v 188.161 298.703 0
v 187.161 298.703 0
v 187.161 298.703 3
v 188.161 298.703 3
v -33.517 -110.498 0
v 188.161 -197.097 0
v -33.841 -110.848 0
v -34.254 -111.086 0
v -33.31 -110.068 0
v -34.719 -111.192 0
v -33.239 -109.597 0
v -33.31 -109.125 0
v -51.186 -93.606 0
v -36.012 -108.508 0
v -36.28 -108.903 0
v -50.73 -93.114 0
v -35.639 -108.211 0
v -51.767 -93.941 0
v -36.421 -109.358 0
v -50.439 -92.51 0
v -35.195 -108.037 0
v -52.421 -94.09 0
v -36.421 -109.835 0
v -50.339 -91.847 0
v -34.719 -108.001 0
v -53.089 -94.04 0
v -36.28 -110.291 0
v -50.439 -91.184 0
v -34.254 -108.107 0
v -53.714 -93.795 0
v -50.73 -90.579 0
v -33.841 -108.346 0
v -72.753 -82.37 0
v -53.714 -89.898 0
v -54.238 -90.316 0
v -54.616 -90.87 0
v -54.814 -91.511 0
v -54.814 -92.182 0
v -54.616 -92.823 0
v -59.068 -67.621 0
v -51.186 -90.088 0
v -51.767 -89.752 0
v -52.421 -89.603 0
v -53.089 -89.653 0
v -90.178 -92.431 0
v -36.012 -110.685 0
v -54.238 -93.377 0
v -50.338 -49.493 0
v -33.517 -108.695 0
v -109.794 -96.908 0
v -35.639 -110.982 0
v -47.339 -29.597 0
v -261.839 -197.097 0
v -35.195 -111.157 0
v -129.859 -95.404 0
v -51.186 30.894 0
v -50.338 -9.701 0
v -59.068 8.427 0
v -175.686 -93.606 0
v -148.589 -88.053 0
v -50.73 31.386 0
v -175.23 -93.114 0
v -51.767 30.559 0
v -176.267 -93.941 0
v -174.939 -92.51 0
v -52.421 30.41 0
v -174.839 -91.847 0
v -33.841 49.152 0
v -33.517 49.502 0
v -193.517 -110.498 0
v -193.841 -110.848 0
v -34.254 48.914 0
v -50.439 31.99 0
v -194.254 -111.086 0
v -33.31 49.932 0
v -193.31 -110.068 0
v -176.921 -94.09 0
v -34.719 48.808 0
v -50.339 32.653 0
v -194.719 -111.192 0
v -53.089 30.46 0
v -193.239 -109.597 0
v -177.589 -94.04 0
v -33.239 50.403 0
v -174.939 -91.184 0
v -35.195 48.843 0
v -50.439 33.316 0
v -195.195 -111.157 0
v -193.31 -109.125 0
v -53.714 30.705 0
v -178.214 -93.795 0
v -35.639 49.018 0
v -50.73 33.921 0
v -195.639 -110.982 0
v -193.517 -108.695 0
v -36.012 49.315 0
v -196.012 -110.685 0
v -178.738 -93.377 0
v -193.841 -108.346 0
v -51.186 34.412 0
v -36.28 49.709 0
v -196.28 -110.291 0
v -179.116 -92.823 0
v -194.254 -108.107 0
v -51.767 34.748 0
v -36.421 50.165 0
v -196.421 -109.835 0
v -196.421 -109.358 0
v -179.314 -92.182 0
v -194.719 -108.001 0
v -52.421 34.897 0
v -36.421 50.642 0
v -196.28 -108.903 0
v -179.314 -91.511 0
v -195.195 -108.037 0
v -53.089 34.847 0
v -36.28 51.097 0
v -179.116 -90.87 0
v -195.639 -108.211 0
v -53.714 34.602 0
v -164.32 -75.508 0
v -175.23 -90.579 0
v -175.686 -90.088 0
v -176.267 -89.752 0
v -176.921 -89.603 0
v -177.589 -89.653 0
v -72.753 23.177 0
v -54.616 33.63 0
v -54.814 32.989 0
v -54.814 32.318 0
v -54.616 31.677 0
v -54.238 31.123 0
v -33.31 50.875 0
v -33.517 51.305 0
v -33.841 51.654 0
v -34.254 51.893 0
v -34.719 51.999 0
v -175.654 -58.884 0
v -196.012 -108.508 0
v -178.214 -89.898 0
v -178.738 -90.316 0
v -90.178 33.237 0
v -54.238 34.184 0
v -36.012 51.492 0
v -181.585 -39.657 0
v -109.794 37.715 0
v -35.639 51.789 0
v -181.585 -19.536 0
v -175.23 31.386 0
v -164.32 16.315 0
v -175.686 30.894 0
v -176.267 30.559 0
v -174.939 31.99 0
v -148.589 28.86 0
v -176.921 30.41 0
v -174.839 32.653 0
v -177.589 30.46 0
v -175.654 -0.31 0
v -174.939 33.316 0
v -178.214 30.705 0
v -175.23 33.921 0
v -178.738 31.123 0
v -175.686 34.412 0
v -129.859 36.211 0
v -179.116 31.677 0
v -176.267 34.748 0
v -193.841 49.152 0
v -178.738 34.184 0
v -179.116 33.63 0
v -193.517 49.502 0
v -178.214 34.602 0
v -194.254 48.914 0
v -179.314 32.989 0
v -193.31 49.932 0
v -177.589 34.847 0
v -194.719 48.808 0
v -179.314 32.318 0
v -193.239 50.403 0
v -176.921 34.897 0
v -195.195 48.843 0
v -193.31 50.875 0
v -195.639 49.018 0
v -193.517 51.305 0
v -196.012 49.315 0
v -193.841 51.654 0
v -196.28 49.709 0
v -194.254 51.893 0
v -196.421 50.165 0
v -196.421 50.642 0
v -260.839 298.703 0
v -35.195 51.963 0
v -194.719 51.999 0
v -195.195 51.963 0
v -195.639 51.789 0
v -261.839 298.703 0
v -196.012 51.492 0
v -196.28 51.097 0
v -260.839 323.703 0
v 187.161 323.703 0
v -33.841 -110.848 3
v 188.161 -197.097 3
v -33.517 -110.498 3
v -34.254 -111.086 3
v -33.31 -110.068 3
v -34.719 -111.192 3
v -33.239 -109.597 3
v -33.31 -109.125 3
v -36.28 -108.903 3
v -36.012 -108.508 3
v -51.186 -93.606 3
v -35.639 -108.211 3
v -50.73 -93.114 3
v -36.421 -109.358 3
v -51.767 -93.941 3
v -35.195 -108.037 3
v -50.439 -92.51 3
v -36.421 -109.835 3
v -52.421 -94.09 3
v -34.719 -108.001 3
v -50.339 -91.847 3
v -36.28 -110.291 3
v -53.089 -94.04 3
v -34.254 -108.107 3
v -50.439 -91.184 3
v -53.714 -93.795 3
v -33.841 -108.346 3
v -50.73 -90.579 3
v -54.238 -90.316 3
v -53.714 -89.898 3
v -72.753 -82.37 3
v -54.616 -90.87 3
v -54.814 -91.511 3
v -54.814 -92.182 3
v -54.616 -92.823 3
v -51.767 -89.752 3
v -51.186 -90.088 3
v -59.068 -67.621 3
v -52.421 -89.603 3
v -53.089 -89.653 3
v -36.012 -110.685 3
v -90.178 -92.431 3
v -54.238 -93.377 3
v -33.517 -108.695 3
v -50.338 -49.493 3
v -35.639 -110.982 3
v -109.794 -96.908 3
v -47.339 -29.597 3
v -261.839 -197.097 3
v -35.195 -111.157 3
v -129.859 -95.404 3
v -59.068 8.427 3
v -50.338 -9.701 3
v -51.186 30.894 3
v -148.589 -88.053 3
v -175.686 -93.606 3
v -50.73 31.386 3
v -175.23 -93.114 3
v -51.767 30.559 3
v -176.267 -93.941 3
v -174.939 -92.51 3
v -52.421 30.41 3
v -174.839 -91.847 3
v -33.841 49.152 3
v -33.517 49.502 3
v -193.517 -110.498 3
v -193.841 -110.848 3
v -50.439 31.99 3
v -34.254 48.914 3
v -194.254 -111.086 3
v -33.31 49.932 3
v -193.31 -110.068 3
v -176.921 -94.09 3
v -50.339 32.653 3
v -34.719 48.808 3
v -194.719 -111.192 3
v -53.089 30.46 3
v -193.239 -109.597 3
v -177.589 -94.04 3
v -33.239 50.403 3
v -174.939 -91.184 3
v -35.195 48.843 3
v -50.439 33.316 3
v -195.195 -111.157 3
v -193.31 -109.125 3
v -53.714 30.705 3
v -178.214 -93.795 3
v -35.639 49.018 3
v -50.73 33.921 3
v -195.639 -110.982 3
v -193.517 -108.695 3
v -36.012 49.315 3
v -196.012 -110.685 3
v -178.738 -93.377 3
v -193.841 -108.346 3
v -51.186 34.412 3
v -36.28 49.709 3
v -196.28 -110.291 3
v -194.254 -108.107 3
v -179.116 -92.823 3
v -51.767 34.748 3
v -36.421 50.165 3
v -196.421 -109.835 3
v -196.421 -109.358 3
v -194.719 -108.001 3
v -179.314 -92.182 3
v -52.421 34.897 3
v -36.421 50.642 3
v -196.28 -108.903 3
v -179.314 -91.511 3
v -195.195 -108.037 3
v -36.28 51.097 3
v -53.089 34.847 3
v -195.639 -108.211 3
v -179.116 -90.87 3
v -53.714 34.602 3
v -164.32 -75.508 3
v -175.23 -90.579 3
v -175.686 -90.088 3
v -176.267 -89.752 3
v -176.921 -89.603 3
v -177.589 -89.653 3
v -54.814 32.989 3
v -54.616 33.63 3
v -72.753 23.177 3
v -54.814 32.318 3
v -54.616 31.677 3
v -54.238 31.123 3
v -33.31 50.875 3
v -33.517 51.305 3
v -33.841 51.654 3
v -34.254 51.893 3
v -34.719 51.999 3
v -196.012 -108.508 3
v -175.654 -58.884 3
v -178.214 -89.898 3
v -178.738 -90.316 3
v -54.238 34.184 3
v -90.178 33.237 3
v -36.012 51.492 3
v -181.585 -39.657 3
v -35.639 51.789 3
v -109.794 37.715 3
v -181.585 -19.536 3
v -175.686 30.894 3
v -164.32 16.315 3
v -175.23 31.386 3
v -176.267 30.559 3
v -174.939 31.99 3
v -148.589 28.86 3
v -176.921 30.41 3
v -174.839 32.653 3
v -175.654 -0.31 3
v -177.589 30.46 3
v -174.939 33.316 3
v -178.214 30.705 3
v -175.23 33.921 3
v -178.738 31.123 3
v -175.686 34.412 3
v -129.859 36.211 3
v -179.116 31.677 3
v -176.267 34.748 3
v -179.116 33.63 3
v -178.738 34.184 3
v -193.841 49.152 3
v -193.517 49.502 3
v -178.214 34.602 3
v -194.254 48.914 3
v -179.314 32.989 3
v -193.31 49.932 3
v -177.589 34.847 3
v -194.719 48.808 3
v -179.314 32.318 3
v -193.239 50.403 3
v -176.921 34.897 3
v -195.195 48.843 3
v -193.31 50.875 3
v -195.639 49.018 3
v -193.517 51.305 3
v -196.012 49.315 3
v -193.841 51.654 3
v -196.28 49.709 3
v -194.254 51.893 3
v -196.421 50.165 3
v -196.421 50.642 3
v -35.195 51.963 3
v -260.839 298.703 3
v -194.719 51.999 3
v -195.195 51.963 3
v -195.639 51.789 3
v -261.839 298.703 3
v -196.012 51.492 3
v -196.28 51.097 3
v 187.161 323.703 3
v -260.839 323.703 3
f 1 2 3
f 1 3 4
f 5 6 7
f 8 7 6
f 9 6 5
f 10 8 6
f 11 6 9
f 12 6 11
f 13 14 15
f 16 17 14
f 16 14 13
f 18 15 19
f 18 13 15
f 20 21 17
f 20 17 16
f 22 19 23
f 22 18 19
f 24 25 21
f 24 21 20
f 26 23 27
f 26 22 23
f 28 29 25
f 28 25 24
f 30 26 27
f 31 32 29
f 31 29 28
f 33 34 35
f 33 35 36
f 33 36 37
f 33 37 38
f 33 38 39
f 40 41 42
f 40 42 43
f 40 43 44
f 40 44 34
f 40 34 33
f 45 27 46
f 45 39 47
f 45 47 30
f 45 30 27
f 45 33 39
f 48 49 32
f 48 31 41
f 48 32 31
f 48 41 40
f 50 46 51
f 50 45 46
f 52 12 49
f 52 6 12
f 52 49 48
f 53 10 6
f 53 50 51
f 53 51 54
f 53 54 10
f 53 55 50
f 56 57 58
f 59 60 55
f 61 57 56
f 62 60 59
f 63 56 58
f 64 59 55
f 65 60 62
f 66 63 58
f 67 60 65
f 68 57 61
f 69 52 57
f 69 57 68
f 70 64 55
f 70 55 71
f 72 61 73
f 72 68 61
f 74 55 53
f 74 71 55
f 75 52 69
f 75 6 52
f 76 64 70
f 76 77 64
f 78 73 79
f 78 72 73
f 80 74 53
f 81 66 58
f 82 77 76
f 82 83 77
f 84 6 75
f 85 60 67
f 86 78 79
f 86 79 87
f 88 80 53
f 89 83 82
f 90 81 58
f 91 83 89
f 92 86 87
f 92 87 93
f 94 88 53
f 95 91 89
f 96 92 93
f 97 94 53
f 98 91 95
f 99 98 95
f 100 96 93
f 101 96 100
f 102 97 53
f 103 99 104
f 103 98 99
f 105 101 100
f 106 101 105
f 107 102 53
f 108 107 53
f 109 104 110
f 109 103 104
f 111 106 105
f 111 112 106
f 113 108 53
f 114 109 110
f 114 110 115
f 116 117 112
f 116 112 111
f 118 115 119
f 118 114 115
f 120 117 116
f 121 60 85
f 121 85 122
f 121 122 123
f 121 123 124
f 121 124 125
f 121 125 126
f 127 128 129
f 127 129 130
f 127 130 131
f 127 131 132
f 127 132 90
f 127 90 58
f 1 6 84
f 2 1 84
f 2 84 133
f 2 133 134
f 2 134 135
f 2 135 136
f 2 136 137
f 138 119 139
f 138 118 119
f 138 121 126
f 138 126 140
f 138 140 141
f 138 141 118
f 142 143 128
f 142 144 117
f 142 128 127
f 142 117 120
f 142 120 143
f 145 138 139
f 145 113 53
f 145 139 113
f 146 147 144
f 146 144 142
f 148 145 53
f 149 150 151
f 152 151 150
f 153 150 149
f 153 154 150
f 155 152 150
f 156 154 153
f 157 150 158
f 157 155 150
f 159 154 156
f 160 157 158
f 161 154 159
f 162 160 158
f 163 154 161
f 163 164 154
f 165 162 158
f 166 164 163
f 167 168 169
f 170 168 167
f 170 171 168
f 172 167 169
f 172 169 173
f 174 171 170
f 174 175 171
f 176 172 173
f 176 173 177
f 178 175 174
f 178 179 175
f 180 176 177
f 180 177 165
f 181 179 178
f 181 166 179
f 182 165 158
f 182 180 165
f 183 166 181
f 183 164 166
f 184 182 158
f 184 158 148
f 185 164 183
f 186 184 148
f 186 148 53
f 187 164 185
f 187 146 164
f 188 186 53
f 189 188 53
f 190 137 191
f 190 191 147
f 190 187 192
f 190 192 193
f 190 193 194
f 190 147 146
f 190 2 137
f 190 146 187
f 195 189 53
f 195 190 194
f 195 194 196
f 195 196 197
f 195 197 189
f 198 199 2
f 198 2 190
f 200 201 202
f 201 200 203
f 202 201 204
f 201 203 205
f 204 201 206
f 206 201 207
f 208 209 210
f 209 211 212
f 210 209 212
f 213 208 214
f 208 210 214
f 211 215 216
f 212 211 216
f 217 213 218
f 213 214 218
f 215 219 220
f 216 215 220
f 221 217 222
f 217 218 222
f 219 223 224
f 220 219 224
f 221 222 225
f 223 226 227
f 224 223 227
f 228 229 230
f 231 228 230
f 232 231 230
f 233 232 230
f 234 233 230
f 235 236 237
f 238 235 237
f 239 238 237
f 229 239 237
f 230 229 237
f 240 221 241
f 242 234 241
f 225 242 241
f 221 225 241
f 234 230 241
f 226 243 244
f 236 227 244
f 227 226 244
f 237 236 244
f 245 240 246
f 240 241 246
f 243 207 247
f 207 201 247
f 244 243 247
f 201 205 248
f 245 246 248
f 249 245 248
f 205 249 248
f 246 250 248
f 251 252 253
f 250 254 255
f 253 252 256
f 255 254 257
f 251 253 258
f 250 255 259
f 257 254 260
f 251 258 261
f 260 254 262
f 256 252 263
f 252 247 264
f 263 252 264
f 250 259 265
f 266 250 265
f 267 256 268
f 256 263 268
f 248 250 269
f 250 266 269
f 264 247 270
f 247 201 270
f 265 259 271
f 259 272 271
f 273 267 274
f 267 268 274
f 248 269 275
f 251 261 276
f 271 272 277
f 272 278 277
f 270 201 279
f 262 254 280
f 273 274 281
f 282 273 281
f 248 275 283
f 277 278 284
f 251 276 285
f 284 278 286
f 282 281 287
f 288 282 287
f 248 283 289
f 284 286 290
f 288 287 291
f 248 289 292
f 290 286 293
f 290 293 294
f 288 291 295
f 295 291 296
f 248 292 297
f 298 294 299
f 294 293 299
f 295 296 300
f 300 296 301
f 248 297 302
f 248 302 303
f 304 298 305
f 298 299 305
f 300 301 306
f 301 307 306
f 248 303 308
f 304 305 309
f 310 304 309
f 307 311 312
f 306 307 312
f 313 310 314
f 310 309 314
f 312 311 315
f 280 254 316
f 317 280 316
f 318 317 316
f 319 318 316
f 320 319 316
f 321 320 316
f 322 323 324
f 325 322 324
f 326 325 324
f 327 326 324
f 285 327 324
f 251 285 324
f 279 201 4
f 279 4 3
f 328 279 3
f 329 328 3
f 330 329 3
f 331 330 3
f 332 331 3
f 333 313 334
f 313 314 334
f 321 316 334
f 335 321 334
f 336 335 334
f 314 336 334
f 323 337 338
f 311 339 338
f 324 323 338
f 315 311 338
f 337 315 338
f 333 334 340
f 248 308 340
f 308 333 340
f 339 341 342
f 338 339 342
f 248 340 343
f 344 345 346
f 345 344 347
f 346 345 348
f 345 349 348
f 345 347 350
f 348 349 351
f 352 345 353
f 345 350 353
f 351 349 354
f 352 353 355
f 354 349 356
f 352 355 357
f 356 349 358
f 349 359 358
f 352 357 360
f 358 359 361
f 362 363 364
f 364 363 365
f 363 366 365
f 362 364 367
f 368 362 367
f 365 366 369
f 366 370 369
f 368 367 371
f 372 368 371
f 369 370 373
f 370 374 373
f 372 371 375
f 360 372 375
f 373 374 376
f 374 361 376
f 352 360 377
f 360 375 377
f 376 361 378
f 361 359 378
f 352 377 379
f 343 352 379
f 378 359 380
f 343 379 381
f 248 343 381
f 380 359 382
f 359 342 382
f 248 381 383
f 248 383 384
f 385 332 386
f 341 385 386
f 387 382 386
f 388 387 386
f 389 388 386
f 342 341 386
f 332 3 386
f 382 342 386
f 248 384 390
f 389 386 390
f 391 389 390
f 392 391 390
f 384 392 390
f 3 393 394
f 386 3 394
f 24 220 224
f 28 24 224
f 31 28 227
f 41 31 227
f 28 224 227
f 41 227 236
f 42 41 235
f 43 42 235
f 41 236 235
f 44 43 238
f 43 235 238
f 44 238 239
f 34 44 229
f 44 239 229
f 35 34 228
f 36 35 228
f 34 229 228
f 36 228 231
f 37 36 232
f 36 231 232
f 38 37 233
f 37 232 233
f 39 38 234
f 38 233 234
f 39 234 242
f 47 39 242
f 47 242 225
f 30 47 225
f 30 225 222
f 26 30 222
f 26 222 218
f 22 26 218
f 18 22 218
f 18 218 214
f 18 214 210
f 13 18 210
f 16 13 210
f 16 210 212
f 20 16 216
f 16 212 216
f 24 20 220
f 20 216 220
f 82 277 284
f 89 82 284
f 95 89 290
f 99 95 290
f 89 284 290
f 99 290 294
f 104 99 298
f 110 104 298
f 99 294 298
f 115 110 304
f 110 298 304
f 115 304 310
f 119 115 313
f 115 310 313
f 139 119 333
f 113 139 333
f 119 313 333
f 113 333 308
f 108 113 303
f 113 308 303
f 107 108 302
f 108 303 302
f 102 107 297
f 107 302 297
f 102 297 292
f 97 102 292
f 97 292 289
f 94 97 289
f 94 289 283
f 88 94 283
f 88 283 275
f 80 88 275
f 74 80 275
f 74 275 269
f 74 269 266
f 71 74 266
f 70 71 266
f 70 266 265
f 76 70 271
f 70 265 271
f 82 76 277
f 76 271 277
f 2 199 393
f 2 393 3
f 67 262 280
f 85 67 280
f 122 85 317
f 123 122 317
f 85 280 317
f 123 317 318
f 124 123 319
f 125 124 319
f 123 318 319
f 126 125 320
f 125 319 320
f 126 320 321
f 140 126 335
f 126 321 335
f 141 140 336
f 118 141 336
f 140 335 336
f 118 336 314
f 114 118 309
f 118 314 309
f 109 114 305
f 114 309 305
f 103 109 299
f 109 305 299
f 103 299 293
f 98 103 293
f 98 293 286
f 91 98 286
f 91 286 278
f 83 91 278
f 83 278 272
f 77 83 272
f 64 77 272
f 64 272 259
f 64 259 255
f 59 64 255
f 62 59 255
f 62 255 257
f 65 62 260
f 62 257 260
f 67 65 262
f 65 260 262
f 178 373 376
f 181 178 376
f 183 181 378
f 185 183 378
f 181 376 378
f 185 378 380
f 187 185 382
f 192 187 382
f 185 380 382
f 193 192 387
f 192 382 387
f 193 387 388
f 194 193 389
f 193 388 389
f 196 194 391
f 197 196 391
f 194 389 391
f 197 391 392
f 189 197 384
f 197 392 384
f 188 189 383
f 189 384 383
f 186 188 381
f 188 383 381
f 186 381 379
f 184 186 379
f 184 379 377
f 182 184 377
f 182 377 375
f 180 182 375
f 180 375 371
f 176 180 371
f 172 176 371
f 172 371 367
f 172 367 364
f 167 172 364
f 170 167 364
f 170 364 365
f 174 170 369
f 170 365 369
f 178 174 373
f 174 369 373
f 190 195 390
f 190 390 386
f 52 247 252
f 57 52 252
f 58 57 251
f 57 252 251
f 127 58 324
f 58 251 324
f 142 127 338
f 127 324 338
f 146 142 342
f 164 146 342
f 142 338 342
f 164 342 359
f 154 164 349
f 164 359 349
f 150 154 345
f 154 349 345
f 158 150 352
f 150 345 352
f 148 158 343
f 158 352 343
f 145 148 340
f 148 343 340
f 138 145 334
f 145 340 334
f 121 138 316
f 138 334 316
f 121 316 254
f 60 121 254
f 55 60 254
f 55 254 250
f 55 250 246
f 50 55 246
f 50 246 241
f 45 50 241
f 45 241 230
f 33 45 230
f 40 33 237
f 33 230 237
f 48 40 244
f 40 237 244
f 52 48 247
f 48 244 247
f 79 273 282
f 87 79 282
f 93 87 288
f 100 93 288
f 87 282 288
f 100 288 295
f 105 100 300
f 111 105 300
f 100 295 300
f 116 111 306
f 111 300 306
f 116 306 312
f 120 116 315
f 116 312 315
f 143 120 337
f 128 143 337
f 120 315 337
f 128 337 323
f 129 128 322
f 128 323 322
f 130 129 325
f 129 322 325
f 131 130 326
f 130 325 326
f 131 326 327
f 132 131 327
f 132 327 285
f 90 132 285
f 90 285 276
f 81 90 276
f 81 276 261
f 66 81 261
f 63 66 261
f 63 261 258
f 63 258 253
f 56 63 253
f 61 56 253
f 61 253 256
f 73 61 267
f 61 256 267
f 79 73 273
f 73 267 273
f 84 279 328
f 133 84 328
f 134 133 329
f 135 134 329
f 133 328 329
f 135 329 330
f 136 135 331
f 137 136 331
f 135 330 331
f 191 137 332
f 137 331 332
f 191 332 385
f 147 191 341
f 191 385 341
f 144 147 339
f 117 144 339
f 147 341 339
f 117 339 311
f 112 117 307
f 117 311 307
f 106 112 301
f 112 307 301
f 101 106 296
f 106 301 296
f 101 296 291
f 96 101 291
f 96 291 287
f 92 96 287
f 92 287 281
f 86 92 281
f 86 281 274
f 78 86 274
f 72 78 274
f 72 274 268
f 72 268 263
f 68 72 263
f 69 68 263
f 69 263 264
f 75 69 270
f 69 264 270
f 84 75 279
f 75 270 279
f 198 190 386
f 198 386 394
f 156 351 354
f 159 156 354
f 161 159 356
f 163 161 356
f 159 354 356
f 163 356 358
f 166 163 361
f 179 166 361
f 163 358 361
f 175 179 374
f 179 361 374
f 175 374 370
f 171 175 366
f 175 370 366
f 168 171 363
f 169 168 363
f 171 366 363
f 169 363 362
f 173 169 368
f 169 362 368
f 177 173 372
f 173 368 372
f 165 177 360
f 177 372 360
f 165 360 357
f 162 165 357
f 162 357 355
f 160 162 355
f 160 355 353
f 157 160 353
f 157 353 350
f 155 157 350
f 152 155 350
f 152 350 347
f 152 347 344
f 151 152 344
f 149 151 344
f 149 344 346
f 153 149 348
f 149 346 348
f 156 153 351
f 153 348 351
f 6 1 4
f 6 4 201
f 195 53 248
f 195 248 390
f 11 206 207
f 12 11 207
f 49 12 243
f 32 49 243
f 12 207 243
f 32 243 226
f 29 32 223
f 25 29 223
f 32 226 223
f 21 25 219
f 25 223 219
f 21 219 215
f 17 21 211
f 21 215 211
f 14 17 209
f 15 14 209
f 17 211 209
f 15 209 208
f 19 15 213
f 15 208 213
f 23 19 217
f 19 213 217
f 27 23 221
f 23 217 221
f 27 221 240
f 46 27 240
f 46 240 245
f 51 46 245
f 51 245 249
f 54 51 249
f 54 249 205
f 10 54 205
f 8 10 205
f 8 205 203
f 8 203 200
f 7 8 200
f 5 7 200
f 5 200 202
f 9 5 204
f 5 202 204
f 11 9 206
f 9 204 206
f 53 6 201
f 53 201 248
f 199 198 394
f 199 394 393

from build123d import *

# Parameters (mm, degrees)
SALIENTE_EXTRUIR1_DEPTH = 3
CROQUIS2_R              = 67.5
CROQUIS2_R_2            = 2.25
CROQUIS2_R_3            = 1.6
CORTAR_EXTRUIR1_DEPTH   = 3


with BuildPart() as part:
    # Croquis1 → Saliente-Extruir1 (new body)
    with BuildSketch(Plane.XY):
        Polygon((-261.838674033, 298.703267526), (-260.838674033, 298.703267526), (-260.838674033, 323.703267526), (187.161325967, 323.703267526), (187.161325967, 298.703267526), (188.161325967, 298.703267526), (188.161325967, -197.096732474), (-261.838674033, -197.096732474), align=None)
    extrude(amount=SALIENTE_EXTRUIR1_DEPTH)

    # Croquis2 → Cortar-Extruir1 (cut)
    with BuildSketch(Plane.XY.offset(3)):
        with Locations((-114.838674033, -29.596732474)):
            Circle(CROQUIS2_R)
        with Locations((-52.588674033, 32.653267526)):
            Circle(CROQUIS2_R_2)
        with Locations((-34.838674033, 50.403267526)):
            Circle(CROQUIS2_R_3)
        with Locations((-52.588674033, -91.846732474)):
            Circle(CROQUIS2_R_2)
        with Locations((-34.838674033, -109.596732474)):
            Circle(CROQUIS2_R_3)
        with Locations((-177.088674033, -91.846732474)):
            Circle(CROQUIS2_R_2)
        with Locations((-194.838674033, -109.596732474)):
            Circle(CROQUIS2_R_3)
        with Locations((-177.088674033, 32.653267526)):
            Circle(CROQUIS2_R_2)
        with Locations((-194.838674033, 50.403267526)):
            Circle(CROQUIS2_R_3)
    extrude(amount=-CORTAR_EXTRUIR1_DEPTH, mode=Mode.SUBTRACT)


solid = part.part
